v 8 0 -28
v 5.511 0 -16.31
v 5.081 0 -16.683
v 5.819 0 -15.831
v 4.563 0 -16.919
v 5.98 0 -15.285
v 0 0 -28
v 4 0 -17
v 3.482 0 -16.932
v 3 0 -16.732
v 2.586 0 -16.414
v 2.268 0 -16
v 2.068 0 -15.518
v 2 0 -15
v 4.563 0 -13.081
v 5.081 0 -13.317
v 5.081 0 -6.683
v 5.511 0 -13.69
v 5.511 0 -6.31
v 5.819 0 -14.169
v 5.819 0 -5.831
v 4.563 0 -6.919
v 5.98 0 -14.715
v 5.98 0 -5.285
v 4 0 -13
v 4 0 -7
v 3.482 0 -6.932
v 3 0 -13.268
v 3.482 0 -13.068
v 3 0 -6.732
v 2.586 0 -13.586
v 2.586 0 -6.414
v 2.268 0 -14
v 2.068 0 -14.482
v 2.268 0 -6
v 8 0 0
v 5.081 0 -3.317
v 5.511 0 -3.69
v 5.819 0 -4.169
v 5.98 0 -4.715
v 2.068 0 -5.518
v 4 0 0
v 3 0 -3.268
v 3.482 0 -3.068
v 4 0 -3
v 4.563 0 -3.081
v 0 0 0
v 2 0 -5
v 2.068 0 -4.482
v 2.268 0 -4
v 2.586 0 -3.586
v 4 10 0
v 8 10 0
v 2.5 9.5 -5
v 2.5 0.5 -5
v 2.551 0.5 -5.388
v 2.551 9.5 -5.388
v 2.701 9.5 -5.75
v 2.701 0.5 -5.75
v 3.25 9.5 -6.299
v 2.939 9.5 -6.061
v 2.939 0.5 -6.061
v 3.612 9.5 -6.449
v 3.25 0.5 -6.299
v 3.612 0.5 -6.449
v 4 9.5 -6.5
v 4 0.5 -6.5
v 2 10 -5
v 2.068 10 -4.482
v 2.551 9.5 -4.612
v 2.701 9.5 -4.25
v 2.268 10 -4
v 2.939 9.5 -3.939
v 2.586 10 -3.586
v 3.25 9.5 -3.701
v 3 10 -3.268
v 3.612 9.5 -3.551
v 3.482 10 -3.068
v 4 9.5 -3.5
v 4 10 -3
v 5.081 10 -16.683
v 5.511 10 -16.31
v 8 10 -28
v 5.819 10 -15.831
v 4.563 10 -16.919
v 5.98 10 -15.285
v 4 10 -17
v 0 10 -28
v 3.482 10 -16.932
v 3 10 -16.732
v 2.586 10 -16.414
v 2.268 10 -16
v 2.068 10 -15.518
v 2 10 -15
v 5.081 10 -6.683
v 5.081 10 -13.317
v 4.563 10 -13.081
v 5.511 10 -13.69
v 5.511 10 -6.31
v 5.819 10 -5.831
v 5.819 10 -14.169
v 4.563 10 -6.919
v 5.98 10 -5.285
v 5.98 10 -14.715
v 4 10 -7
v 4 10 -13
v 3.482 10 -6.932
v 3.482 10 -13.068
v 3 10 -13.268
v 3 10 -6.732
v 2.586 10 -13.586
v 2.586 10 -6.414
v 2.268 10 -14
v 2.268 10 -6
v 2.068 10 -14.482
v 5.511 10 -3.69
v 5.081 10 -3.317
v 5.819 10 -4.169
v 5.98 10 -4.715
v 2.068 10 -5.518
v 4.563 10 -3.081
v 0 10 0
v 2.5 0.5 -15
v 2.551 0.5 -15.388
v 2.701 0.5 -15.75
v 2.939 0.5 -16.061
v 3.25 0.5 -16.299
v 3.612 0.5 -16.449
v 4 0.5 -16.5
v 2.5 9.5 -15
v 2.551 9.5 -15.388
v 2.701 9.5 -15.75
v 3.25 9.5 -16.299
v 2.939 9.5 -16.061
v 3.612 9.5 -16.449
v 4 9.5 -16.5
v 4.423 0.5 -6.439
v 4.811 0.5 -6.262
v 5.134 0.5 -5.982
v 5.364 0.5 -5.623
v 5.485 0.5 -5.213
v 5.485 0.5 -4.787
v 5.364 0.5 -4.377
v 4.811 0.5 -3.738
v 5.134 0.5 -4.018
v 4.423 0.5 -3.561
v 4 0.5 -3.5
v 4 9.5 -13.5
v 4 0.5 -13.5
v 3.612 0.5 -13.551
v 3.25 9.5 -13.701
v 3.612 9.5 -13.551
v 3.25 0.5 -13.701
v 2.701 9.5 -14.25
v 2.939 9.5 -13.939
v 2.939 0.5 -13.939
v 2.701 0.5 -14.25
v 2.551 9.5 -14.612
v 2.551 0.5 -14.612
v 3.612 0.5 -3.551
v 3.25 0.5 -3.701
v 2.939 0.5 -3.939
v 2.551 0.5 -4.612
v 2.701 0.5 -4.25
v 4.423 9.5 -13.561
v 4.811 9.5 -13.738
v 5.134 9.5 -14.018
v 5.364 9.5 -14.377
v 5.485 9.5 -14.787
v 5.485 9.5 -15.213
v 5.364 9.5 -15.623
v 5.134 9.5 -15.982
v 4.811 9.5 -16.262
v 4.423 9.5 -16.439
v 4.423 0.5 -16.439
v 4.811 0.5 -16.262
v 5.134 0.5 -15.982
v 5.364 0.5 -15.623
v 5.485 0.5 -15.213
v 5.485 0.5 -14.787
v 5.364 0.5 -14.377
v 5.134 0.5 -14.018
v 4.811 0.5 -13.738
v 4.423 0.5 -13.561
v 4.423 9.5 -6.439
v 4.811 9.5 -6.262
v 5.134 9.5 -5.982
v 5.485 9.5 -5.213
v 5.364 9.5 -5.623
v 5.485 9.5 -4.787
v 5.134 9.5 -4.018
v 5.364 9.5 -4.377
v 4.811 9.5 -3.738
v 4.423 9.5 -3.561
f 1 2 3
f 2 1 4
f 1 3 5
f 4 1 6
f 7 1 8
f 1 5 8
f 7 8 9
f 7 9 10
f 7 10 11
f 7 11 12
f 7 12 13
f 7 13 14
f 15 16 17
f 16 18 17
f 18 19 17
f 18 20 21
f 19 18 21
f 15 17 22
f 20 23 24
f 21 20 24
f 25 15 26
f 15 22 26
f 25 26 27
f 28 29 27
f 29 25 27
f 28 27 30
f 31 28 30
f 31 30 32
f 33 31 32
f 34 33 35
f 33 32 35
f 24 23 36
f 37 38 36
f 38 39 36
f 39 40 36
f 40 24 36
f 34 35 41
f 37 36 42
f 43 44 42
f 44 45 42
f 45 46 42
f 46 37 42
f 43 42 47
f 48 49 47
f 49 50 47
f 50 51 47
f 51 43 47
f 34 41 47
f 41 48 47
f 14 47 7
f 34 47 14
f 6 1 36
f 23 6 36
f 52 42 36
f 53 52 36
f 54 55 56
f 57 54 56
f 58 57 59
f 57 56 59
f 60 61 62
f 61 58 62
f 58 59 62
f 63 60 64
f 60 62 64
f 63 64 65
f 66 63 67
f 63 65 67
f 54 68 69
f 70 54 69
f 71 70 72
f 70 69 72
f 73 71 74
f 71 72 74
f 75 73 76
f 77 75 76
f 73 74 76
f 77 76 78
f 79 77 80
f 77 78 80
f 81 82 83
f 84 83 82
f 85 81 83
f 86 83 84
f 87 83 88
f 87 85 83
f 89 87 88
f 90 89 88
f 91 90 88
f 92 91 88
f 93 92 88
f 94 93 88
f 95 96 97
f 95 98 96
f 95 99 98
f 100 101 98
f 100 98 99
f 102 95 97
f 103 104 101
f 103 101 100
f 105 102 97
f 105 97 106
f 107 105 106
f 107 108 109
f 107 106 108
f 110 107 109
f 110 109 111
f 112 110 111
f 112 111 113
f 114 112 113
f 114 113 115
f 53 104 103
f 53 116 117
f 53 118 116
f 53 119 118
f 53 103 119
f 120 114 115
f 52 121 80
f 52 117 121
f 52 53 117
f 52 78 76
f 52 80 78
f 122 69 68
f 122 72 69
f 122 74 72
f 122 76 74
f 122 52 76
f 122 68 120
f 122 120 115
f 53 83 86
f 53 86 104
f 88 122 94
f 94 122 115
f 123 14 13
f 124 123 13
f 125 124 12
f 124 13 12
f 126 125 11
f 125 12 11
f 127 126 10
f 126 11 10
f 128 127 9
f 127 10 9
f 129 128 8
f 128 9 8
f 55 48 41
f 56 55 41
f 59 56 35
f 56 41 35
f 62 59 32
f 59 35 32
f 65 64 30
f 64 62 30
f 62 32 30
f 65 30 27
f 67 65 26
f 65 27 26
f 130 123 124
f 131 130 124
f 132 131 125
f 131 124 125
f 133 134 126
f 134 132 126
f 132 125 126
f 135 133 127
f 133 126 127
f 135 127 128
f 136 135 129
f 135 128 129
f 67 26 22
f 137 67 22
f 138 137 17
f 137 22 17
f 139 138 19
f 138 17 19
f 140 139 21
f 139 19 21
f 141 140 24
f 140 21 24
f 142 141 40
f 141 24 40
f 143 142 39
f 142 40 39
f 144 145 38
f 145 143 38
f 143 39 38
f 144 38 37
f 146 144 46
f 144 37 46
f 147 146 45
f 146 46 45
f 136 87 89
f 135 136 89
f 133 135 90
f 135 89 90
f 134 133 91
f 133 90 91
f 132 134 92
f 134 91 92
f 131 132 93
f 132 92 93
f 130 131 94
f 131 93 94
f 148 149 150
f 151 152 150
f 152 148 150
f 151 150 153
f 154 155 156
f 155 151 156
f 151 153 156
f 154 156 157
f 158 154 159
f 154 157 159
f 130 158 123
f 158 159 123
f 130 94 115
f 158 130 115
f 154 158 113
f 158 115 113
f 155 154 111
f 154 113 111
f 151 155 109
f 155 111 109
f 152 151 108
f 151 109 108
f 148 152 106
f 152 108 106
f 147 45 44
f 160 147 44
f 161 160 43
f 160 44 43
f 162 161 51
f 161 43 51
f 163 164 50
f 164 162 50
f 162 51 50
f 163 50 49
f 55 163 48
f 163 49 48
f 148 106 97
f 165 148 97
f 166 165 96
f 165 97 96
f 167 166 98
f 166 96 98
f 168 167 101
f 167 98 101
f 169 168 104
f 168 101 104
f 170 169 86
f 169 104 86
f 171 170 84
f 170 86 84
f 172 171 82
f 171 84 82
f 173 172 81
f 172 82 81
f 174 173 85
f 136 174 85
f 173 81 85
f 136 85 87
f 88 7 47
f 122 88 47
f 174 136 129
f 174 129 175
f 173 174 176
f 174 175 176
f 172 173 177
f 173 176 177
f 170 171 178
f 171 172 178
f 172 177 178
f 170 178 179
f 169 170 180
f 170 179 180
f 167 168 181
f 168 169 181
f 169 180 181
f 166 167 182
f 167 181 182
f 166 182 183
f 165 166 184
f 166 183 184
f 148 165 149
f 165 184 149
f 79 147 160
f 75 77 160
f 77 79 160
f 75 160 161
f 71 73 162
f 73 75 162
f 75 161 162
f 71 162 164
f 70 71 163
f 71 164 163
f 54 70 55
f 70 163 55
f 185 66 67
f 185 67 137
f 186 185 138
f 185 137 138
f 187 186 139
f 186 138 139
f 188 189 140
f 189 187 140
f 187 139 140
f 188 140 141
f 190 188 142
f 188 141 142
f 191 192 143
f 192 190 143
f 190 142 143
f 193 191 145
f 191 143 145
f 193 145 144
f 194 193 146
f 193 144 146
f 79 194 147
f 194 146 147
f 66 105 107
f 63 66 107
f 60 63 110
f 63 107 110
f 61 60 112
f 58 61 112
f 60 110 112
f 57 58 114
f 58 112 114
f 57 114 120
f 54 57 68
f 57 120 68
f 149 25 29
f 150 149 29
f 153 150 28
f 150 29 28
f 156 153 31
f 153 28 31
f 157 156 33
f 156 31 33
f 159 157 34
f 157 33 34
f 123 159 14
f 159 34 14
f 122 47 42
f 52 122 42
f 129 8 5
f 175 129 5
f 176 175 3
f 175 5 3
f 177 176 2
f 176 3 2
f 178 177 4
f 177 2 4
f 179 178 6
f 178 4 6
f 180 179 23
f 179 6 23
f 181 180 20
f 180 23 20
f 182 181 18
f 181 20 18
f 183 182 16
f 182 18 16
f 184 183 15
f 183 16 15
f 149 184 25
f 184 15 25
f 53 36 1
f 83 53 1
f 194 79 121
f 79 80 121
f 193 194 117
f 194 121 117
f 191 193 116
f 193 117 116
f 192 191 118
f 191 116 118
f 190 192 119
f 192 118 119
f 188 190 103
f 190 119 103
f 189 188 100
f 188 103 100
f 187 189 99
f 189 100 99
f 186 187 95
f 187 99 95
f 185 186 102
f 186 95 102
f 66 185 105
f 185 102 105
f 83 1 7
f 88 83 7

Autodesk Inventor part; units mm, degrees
ref_plane "YZ Plane" through (0, 0, 0) normal (1, 0, 0) x (0, 1, 0)
ref_plane "XZ Plane" through (0, 0, 0) normal (0, 1, 0) x (-1, 0, 0)
ref_plane "XY Plane" through (0, 0, 0) normal (0, 0, 1) x (1, 0, 0)
sketch "Эскиз1" plane through (0, 0, 0) normal (0, 1, 0) x (-1, 0, 0)
  line L0 (0, 0) -> (-8, 0)
  line L1 (-8, 0) -> (-8, -28)
  line L2 (-8, -28) -> (0, -28)
  line L3 (0, -28) -> (0, 0)
  line L4 (-4, 0) -> (-4, -10)
  line L5 (-4, -10) -> (-4, -20)
  line L6 (-4, -20) -> (-4, -15)
  line L7 (-4, 0) -> (-4, -5)
  circle A0 centre (-4, -5) radius 1.5
  circle A1 centre (-4, -15) radius 1.5
  dimension "d0" = 8
  dimension "d1" = 28
  dimension "d2" = 10
  dimension "d3" = 10
  dimension "d4" = 3
extrude "Выдавливание1" add sketch "Эскиз1" along normal blind 10
chamfer "Фаска1" distance 0.5 angle 45 4 edges at (5.5, 10, -5) (5.5, 10, -15) (5.5, 0, -15) (5.5, 0, -5)
properties part number "Ограничитель"
